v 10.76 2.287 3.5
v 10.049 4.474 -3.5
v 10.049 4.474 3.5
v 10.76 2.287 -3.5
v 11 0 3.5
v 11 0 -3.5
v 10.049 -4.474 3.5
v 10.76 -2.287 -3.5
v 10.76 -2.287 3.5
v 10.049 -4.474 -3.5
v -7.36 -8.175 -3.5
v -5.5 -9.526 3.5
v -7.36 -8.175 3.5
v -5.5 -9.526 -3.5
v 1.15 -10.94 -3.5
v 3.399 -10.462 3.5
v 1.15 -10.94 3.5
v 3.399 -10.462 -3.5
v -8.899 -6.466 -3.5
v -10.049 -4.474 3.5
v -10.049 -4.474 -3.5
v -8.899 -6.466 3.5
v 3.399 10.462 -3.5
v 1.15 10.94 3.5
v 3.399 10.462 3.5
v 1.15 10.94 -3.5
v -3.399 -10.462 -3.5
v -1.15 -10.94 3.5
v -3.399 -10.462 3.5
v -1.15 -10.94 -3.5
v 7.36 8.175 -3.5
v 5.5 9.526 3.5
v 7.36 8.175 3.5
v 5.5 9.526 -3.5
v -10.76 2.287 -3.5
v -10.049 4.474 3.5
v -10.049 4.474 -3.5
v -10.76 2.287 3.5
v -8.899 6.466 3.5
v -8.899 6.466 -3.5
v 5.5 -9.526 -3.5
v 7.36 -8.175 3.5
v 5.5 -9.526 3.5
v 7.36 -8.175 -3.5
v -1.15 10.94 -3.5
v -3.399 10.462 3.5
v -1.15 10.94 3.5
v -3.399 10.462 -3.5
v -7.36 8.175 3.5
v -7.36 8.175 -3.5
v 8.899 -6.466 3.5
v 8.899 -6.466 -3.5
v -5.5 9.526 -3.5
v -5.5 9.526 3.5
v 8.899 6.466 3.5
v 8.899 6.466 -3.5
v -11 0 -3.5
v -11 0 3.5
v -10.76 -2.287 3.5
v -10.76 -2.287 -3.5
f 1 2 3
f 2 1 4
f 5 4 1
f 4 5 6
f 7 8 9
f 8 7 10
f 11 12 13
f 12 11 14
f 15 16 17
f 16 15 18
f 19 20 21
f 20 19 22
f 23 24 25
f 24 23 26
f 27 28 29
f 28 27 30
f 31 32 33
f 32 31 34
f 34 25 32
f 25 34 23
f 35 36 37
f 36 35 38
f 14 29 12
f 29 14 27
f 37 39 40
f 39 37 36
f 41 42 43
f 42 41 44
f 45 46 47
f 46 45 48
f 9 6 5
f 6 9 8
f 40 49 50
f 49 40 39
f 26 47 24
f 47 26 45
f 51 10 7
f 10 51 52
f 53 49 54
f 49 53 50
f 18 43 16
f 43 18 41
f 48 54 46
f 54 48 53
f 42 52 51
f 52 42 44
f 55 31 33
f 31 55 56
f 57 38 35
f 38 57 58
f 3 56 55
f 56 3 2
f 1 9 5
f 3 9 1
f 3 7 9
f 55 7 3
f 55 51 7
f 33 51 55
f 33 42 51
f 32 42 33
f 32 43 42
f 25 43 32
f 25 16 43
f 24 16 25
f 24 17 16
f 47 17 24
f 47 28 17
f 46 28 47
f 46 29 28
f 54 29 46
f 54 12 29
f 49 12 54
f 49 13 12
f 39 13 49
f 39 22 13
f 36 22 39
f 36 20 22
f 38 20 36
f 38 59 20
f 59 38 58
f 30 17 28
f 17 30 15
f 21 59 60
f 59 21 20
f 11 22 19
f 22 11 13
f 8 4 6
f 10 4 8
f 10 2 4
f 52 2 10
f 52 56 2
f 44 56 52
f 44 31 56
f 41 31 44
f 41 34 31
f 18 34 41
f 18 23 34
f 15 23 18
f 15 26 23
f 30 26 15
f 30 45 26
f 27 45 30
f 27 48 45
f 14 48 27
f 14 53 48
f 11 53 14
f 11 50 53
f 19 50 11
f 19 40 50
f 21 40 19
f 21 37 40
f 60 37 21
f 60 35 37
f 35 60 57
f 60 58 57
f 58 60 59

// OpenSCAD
// Parameters
outer_diameter_mm = 22; //[11:44:0.1]
inner_bore_diameter_mm = 8; //[4:16:0.1]
thickness_mm = 7; //[3.5:14:0.1]
centered = 1; //[0:1:1]
eps_mm = 0.6; //[0.2:1.5:0.1]

// Base Shapes
module outer_cylindrical_surface() {
  cylinder(r=outer_diameter_mm/2, h=thickness_mm, center=true);
}

module inner_bore_surface() {
  cylinder(r=inner_bore_diameter_mm/2, h=thickness_mm + 2*eps_mm, center=true);
}

module flat_end_faces() {
  cylinder(r=outer_diameter_mm/2, h=thickness_mm, center=true);
}

module placeholder_box() {
  cube([eps_mm, eps_mm, eps_mm], center=true);
}

// Operations
module bearing_ring_body() {
  difference() {
    outer_cylindrical_surface();
    inner_bore_surface();
  }
}

module bearing_complete_union() {
  union() {
    bearing_ring_body();
    flat_end_faces();
    placeholder_box(); // MT3608_carrier_stl
    placeholder_box(); // round_grommet_top
    placeholder_box(); // round_grommet_assembly
  }
}

// Final Output
bearing_complete_union();
